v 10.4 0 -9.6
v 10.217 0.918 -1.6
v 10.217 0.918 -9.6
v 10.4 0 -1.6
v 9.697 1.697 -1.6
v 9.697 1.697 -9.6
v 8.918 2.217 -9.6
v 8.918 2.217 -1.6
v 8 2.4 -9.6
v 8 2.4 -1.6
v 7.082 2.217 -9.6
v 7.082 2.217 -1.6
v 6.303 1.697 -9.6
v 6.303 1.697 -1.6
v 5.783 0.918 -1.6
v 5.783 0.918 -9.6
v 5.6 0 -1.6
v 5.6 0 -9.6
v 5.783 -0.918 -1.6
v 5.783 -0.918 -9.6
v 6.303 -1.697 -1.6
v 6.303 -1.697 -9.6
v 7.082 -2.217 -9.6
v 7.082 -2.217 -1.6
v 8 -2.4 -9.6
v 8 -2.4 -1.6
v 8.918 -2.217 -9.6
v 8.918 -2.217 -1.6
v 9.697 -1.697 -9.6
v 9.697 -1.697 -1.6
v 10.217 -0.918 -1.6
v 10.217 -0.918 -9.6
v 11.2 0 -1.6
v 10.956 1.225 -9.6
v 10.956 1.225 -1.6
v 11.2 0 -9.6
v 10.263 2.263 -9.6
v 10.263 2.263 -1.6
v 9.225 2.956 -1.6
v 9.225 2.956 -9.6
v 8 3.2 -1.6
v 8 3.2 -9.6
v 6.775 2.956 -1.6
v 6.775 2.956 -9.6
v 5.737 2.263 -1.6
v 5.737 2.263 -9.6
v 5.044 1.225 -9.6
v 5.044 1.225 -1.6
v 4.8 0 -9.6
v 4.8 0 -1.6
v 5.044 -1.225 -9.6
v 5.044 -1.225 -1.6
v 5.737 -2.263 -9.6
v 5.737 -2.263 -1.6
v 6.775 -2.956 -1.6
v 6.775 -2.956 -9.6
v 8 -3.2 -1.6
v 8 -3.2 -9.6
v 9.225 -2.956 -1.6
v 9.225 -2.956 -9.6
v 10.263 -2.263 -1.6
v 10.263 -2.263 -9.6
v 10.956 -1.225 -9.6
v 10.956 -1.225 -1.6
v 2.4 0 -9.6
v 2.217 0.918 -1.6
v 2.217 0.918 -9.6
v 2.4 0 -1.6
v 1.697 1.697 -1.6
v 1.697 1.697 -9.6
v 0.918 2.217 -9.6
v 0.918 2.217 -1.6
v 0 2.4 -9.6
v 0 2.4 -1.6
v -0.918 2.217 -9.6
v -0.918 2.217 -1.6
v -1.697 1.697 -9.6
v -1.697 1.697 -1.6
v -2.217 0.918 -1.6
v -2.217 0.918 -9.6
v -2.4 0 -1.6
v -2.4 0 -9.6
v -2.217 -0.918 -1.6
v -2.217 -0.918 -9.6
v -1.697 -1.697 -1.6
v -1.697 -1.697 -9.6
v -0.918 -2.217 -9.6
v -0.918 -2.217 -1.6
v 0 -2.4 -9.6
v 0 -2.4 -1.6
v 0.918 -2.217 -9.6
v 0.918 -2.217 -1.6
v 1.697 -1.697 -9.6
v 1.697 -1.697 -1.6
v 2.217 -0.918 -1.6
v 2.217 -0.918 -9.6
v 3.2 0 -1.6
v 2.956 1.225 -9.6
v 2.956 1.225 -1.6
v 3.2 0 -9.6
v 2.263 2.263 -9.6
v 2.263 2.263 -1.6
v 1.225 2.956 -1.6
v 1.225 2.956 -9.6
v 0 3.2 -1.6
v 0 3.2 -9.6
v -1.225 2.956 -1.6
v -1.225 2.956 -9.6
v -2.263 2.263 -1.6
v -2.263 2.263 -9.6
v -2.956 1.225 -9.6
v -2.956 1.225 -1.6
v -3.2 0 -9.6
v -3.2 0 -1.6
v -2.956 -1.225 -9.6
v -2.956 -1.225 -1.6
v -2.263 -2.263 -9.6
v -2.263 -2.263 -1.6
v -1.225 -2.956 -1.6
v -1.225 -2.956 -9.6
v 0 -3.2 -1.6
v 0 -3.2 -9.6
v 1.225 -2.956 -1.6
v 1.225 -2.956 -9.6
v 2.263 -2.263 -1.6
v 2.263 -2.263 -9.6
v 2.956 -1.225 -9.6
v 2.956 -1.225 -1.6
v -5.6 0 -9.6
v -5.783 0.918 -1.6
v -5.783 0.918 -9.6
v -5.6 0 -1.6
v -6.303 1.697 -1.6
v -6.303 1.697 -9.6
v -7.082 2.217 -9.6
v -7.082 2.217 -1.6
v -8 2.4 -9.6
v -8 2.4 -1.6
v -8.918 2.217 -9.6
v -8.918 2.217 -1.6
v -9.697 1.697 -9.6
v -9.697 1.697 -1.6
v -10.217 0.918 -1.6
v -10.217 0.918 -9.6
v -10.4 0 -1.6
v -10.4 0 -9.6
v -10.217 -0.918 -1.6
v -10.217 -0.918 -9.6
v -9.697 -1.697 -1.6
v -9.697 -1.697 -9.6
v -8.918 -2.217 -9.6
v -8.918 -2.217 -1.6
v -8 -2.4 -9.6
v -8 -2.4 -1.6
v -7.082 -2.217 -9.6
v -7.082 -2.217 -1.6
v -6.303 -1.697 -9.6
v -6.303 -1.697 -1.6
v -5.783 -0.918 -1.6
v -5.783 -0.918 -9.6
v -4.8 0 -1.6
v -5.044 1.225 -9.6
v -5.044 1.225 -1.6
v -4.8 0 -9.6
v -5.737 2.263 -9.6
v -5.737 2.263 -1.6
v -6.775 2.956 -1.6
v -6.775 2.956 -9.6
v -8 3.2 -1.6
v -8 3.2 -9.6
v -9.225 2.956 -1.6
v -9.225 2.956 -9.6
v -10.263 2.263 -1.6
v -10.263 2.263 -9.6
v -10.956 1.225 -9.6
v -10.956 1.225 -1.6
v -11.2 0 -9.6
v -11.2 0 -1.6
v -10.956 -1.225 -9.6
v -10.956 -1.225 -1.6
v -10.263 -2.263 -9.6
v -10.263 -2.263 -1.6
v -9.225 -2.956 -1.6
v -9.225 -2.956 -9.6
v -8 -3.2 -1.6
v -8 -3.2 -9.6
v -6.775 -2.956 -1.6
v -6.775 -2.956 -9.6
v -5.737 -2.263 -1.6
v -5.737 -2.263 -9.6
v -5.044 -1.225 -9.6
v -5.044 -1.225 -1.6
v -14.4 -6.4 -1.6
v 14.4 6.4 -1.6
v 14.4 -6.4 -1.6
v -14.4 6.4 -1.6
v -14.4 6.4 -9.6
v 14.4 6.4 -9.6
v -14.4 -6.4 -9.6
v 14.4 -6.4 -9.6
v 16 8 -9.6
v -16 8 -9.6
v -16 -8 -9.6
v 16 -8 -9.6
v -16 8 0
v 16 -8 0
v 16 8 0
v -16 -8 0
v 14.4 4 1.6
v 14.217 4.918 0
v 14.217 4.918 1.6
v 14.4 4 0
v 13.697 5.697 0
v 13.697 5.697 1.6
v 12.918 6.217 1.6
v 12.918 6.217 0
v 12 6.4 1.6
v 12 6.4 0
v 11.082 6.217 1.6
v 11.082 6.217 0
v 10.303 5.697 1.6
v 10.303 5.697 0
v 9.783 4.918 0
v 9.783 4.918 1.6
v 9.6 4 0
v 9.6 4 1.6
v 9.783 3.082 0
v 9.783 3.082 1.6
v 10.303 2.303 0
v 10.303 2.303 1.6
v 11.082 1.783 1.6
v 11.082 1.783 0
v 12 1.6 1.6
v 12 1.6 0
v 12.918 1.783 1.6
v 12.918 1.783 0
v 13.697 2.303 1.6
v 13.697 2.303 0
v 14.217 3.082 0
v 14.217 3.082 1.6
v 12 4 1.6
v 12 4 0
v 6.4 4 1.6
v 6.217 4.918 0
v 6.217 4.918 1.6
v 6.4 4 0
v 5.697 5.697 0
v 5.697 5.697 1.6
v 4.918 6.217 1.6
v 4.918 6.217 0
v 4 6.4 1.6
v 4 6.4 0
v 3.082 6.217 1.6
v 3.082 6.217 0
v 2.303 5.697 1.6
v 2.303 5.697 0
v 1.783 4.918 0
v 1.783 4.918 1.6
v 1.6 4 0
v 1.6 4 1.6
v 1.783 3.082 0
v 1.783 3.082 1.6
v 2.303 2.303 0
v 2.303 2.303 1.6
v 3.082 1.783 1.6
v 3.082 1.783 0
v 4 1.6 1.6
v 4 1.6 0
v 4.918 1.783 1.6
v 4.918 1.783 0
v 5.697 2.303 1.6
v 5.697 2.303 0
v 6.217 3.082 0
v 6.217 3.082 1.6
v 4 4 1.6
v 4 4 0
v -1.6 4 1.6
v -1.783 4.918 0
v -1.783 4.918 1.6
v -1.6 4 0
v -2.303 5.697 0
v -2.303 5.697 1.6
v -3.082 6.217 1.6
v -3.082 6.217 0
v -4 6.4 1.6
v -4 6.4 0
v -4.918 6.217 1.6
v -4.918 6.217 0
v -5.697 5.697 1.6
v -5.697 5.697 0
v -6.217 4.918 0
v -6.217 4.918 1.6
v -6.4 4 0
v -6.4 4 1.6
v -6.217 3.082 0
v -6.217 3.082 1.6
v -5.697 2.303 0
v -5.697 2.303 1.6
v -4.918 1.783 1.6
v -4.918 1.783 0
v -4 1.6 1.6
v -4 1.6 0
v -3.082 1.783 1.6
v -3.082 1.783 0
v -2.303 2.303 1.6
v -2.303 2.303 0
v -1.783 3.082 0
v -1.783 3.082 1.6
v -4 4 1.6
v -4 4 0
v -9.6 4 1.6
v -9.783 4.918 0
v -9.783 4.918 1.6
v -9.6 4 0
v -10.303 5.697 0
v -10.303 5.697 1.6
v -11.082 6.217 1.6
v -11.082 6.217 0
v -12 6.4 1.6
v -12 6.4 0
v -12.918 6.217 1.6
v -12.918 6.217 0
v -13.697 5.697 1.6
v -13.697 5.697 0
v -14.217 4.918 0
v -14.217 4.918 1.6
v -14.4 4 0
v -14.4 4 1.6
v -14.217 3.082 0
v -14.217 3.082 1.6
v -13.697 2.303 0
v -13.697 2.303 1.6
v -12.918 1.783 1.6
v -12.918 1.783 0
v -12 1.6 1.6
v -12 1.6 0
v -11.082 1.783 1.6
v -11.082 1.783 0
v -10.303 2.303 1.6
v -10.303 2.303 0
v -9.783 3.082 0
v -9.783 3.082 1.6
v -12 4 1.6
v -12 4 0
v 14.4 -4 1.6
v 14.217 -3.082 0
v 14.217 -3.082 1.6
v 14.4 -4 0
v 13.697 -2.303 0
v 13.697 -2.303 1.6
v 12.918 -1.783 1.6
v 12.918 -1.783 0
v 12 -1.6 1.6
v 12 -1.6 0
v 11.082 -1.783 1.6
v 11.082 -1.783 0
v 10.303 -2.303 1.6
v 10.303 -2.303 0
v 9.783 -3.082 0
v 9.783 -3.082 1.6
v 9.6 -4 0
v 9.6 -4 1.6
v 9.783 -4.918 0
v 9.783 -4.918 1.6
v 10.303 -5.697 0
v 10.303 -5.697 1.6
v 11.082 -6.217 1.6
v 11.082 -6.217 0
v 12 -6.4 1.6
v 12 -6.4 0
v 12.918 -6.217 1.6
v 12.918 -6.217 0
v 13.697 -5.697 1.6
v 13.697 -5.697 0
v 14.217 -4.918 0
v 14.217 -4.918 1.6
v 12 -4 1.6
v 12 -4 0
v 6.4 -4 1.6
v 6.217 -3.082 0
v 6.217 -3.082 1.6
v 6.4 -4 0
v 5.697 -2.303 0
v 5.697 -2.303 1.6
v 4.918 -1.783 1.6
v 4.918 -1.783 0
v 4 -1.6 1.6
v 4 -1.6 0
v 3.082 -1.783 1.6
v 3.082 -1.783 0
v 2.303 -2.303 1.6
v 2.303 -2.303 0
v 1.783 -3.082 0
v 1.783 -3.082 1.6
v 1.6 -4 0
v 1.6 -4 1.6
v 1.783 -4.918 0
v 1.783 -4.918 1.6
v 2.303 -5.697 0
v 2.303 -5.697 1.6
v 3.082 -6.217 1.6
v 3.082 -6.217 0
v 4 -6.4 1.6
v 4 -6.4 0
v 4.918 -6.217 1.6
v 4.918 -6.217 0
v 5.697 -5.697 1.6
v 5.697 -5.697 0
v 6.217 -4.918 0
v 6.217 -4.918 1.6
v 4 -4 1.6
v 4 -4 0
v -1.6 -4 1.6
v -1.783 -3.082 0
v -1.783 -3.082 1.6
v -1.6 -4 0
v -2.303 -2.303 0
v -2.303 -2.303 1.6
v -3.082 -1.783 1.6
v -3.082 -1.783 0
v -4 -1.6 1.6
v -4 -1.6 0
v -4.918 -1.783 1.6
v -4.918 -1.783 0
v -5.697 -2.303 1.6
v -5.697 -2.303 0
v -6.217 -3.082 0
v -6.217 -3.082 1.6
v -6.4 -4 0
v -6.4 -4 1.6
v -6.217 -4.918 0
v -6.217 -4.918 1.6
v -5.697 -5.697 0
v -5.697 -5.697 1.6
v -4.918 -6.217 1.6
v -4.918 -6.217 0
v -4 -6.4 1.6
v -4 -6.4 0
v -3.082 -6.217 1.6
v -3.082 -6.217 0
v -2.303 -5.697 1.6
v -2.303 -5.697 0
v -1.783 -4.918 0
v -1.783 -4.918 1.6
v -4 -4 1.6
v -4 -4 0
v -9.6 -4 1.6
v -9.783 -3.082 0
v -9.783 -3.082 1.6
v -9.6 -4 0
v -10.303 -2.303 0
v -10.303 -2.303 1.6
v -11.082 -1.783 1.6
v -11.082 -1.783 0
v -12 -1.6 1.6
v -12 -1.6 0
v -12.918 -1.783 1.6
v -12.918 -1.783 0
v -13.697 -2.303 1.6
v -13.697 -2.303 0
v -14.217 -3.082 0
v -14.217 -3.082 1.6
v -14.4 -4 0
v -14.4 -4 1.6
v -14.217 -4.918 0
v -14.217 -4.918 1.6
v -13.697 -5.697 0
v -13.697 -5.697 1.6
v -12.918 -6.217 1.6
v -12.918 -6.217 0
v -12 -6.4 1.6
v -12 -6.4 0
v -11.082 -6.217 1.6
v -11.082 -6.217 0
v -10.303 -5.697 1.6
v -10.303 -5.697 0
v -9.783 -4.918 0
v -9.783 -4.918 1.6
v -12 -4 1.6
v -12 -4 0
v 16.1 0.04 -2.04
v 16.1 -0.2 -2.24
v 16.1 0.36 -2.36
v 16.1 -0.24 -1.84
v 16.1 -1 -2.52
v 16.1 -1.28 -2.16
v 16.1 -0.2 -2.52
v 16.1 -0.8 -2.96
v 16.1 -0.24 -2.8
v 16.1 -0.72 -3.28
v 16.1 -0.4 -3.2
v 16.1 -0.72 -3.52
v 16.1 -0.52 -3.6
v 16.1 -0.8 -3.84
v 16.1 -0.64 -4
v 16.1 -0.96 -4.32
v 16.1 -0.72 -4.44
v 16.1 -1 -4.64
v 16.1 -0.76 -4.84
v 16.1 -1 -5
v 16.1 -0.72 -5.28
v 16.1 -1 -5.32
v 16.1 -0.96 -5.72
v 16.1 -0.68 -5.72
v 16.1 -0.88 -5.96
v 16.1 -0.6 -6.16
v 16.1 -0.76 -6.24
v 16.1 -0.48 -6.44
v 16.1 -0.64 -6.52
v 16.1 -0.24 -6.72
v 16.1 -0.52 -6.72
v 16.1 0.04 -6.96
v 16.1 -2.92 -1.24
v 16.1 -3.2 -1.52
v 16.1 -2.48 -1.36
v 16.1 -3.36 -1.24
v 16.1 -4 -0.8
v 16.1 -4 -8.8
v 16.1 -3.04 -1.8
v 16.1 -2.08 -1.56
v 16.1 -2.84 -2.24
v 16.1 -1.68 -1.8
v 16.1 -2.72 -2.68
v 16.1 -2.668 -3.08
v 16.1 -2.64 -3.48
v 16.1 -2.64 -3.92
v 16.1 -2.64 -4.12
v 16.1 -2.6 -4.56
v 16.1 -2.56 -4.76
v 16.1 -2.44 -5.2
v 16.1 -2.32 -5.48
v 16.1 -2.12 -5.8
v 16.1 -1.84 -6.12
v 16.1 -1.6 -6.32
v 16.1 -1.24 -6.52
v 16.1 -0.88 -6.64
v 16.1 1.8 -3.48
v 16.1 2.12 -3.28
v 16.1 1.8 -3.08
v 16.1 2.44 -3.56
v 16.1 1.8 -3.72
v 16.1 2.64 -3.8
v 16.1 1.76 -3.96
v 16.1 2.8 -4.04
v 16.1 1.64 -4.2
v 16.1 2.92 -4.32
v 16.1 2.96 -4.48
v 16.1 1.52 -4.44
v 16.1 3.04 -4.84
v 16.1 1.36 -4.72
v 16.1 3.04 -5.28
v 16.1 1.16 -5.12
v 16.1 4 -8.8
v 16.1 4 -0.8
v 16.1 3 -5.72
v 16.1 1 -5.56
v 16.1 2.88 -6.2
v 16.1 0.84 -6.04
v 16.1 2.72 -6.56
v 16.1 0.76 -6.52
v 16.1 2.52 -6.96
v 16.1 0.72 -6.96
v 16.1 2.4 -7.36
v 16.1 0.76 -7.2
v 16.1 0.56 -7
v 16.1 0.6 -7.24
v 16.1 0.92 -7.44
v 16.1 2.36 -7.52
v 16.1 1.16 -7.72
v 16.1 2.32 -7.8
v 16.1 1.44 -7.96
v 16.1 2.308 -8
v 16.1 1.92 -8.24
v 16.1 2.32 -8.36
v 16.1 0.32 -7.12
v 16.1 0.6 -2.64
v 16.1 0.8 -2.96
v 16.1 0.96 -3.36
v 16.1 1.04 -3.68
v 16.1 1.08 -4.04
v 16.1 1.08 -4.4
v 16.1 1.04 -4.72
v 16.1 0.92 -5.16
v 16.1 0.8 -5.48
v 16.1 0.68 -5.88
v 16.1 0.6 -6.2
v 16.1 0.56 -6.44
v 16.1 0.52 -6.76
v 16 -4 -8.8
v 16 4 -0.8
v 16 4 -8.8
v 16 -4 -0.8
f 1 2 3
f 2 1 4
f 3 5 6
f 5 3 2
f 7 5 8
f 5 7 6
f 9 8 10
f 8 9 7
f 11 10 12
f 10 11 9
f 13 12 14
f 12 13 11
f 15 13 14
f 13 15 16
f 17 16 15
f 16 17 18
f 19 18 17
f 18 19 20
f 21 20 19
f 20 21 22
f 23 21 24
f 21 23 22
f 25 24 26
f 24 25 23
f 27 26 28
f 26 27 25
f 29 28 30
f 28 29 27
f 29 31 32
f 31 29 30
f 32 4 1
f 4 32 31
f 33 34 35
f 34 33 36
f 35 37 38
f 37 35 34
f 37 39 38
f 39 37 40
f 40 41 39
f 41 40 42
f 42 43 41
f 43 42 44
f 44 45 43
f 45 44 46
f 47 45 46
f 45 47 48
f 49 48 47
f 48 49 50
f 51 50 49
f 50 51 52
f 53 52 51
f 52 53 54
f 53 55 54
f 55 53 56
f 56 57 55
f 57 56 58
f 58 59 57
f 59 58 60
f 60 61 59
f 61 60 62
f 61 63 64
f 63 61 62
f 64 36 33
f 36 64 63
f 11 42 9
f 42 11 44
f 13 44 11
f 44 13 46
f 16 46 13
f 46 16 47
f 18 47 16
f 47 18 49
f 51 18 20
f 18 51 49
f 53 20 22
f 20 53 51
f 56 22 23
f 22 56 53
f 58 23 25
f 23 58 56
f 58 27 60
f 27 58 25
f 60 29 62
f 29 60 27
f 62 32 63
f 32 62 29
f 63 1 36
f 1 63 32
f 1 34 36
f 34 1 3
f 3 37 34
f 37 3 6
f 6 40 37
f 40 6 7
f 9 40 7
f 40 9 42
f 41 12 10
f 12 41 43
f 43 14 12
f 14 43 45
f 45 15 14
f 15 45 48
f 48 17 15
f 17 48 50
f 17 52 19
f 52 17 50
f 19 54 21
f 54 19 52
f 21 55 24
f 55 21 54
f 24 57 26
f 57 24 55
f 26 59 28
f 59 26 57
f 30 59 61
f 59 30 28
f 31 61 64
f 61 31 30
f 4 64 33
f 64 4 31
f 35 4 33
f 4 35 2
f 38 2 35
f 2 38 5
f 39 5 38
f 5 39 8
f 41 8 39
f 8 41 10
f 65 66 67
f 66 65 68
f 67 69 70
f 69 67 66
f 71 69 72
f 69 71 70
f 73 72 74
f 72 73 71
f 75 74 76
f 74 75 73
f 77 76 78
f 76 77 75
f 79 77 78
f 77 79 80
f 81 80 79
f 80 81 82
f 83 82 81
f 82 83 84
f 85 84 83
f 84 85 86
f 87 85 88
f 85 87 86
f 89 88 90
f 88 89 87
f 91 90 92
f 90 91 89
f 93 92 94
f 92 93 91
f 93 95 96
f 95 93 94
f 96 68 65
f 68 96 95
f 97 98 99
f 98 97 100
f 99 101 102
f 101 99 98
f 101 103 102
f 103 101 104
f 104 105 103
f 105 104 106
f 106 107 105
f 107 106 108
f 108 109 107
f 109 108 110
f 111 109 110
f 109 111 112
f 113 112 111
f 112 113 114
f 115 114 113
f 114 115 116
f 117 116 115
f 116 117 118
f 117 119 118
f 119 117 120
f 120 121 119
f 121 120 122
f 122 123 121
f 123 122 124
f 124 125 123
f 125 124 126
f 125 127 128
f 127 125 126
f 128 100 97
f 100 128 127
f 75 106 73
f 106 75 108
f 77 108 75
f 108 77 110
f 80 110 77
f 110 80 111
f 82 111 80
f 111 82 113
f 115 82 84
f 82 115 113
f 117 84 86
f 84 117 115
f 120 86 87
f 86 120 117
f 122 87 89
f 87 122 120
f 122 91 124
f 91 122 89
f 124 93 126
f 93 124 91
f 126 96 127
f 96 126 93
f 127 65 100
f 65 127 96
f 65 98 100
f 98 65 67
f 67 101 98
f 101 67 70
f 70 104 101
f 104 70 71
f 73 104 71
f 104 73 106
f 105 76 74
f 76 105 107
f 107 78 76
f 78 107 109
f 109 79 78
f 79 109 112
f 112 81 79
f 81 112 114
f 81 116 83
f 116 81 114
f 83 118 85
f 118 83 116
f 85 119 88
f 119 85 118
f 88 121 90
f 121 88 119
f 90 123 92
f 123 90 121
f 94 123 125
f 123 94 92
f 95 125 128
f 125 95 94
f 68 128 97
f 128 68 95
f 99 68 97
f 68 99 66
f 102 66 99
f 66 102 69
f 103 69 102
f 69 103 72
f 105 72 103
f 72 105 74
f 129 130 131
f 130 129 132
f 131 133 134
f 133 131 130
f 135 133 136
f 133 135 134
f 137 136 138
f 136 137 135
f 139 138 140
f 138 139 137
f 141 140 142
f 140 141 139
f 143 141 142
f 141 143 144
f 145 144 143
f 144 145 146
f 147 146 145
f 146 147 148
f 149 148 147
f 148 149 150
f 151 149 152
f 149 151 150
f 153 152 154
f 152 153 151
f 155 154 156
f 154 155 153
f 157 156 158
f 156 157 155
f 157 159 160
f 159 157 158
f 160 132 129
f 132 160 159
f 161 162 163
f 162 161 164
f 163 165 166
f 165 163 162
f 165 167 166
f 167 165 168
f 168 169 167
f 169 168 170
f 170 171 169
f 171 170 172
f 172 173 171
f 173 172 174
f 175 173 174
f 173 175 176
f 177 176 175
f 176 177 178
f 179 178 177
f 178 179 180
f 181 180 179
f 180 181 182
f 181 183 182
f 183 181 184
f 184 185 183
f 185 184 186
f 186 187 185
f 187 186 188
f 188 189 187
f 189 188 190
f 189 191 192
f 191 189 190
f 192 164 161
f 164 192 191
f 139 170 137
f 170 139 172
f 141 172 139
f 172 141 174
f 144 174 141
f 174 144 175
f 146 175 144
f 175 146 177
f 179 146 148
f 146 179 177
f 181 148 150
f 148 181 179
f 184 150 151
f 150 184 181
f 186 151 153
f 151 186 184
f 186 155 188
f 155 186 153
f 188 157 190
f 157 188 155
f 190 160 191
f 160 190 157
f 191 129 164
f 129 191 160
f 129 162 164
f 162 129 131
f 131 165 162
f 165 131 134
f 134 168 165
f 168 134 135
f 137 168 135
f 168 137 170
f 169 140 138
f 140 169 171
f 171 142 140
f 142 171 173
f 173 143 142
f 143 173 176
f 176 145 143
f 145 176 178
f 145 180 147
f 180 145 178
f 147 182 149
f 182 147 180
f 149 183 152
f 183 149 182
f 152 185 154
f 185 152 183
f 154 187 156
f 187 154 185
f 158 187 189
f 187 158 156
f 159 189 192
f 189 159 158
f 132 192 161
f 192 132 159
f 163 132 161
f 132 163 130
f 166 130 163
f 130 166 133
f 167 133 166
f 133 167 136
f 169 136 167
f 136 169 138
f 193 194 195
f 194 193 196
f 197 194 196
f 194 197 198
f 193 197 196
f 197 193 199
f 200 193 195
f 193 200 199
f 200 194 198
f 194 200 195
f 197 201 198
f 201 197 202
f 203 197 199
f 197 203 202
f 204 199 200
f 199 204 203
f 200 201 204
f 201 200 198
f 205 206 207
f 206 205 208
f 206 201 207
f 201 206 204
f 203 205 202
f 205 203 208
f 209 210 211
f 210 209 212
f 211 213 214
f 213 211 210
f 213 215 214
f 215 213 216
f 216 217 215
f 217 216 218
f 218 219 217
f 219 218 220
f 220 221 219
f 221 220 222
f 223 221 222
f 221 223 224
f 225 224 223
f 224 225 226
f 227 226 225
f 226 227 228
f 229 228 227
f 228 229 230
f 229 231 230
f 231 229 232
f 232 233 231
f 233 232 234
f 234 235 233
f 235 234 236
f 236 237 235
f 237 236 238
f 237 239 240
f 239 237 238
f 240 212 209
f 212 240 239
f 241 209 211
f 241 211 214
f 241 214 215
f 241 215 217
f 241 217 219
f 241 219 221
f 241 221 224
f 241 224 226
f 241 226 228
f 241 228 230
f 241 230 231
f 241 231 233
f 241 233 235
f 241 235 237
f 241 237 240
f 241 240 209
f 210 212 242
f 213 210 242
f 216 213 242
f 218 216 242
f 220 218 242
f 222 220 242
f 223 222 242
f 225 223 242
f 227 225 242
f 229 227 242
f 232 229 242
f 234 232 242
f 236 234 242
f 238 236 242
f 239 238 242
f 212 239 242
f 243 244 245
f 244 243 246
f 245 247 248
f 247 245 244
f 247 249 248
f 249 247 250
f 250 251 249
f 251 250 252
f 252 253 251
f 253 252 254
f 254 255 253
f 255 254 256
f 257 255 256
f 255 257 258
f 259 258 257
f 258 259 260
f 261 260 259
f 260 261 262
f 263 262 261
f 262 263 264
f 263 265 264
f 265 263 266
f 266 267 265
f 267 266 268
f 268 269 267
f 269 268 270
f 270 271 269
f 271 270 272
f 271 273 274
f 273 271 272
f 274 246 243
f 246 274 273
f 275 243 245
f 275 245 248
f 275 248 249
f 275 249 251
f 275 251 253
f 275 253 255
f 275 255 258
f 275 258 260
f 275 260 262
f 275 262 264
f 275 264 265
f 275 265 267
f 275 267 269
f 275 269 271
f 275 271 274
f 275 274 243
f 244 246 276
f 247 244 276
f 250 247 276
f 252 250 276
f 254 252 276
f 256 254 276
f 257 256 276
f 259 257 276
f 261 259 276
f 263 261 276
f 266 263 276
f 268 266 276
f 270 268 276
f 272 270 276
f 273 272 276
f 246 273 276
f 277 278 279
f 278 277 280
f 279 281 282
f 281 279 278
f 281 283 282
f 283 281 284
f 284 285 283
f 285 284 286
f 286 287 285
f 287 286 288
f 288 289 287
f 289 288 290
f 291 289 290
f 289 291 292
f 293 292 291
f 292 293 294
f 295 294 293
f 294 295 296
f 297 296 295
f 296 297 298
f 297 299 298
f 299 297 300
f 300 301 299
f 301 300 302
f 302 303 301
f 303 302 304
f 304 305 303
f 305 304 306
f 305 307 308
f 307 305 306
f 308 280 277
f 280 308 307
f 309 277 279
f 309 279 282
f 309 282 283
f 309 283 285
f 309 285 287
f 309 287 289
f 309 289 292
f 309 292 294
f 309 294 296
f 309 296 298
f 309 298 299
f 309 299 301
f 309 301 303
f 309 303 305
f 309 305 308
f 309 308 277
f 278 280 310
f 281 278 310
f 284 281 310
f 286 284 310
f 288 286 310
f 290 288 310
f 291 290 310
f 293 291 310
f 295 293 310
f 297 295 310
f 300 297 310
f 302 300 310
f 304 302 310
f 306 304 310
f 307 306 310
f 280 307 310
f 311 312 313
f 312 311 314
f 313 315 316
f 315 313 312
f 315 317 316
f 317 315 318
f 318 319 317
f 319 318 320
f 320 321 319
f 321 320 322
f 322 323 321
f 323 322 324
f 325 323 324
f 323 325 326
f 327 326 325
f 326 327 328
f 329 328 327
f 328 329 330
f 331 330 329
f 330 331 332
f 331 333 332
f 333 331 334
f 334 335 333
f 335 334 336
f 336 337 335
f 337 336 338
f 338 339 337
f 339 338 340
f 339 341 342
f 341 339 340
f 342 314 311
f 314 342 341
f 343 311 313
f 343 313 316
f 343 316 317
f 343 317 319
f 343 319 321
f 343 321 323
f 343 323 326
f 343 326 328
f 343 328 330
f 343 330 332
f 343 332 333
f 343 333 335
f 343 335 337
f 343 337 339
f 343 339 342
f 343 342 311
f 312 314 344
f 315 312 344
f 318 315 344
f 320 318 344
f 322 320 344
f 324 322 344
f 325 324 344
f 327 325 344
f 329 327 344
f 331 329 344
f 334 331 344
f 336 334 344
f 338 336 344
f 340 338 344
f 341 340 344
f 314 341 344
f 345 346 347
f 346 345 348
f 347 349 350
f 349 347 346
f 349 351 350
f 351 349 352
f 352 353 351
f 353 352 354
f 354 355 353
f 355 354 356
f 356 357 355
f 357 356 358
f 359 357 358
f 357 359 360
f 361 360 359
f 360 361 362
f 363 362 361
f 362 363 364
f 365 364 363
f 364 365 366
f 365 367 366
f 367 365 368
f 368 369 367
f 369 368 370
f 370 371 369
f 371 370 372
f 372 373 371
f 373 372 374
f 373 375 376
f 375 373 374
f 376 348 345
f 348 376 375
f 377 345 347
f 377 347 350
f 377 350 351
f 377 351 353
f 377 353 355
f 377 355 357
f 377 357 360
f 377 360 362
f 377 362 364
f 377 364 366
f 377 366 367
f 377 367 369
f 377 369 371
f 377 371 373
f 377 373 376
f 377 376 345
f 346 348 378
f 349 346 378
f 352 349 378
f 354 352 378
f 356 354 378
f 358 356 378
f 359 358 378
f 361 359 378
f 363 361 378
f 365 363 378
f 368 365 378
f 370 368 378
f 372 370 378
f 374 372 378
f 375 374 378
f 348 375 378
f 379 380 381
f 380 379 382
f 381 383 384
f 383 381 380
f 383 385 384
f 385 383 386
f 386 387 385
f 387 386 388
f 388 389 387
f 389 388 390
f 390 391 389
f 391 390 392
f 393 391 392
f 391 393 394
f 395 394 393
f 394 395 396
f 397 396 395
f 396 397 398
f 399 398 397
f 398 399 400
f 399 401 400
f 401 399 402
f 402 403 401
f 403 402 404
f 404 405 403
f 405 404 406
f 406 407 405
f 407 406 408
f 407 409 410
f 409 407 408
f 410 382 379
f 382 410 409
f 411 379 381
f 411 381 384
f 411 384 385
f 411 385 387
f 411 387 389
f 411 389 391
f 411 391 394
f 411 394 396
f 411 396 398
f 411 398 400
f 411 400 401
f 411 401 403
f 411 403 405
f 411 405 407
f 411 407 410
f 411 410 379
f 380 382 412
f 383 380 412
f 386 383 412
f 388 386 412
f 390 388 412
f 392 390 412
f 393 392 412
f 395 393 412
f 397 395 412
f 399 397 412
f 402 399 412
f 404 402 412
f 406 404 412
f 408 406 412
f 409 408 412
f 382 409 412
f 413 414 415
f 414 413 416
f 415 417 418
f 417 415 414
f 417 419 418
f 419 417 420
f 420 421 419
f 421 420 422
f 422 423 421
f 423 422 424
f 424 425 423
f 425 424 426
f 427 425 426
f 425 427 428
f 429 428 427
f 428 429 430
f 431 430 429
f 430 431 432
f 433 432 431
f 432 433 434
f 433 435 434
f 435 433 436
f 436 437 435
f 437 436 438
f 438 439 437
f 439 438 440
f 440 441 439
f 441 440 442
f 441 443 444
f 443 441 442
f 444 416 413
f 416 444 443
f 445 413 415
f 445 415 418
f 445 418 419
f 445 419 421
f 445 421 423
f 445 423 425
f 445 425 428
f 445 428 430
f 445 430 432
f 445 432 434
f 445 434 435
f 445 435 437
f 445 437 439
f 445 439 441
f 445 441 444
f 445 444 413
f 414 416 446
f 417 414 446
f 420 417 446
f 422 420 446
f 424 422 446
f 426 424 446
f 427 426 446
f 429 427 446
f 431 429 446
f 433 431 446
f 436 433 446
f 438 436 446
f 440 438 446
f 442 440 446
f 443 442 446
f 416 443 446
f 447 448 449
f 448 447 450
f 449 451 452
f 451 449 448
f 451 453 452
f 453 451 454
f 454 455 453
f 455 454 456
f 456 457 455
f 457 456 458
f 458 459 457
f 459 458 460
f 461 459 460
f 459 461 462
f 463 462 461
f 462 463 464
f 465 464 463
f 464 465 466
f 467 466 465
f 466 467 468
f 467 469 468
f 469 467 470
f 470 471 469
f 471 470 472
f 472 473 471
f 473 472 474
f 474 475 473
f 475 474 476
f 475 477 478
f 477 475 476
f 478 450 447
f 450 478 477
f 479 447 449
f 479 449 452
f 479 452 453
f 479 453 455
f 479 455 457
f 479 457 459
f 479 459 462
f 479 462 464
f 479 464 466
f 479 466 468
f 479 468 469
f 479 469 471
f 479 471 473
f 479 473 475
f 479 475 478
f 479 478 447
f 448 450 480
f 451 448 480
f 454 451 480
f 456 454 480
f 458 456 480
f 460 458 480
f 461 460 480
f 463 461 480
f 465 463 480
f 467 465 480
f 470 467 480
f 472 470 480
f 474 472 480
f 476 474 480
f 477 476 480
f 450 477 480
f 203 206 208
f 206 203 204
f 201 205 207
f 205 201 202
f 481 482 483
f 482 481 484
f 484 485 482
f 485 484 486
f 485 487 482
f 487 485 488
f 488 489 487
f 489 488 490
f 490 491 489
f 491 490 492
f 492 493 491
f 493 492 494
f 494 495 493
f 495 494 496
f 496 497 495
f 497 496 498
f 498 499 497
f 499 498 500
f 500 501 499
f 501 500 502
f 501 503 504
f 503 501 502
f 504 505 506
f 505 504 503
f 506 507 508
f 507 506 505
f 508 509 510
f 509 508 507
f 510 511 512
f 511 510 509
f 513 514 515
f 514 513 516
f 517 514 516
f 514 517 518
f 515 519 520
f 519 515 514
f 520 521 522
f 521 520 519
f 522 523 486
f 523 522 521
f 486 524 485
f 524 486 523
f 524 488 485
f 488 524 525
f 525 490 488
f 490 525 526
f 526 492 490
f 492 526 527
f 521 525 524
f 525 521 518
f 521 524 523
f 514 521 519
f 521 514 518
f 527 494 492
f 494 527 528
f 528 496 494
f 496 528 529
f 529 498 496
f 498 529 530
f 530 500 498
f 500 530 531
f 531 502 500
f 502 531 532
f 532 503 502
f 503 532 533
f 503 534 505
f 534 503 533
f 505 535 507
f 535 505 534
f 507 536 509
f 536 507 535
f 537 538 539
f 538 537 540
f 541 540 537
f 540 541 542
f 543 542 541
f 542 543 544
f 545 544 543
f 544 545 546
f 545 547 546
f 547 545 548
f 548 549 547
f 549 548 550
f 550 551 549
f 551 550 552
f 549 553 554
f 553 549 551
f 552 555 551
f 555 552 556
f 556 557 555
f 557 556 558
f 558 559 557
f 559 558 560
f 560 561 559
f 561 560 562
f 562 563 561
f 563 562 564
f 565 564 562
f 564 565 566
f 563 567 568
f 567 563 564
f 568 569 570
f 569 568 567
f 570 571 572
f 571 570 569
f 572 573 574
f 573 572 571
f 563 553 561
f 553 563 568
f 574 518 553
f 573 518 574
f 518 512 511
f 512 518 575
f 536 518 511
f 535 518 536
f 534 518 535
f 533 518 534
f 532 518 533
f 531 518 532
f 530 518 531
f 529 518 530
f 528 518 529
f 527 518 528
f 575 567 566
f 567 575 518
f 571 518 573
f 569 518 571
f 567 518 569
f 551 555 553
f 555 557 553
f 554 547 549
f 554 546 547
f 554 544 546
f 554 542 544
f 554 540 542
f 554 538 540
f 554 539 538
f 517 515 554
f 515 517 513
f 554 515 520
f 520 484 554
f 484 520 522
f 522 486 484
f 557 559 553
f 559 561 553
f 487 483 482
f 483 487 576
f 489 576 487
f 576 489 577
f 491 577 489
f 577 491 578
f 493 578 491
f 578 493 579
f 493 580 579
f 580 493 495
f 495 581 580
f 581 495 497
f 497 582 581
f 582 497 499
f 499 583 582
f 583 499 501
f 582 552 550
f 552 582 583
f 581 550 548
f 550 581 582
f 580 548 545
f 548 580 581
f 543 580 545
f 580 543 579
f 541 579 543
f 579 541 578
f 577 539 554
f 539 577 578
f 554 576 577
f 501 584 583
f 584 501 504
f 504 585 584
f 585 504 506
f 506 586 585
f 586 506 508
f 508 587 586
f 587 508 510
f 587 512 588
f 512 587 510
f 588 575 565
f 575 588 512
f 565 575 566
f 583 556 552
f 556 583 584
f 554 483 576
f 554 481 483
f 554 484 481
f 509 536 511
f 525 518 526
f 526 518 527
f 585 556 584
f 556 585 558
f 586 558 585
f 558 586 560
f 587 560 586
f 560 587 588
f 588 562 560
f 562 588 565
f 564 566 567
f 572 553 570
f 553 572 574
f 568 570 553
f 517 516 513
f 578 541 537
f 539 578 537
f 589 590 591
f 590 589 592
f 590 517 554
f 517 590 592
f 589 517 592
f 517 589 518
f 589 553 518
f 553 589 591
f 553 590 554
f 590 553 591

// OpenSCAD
use <../lib.scad>
use <004452e.scad>
use <3001.scad>
function ldraw_lib__3001d03() = [
// 0 Brick  2 x  4 with Fire Logo Sticker on End
// 0 Name: 3001d03.dat
// 0 Author: Takeshi Takahashi [RainbowDolphin]
// 0 !LDRAW_ORG Shortcut UPDATE 2024-05
// 0 !LICENSE Licensed under CC BY 4.0 : see CAreadme.txt
// 
// 0 BFC CERTIFY CCW
  [0,"BFC","CERTIFY"],
  [0,"BFC","CCW"],
// 
// 0 !CATEGORY Sticker Shortcut
// 0 !KEYWORDS Bricklink 3001oldpb10, Fire engine, Set 374-1
// 
// 0 !HISTORY 2024-06-30 [OrionP] Official Update 2024-05
// 
// 1 16 0 0 0 1 0 0 0 1 0 0 0 1 3001.dat
  [1,16,0,0,0,1,0,0,0,1,0,0,0,1, ldraw_lib__3001()],
// 1 16 40 12 0 0 -1 0 0 0 -1 1 0 0 004452e.dat
  [1,16,40,12,0,0,-1,0,0,0,-1,1,0,0, ldraw_lib__004452e()],
];
module ldraw_lib__3001d03(step=0, col=false, unit=2/5, alt=false, line=0.2, solid=!$preview)
    makepoly(ldraw_lib__3001d03(), step=step, col=col, unit=unit, alt=alt, line=line, solid=solid);
ldraw_lib__3001d03(line=0.2);
